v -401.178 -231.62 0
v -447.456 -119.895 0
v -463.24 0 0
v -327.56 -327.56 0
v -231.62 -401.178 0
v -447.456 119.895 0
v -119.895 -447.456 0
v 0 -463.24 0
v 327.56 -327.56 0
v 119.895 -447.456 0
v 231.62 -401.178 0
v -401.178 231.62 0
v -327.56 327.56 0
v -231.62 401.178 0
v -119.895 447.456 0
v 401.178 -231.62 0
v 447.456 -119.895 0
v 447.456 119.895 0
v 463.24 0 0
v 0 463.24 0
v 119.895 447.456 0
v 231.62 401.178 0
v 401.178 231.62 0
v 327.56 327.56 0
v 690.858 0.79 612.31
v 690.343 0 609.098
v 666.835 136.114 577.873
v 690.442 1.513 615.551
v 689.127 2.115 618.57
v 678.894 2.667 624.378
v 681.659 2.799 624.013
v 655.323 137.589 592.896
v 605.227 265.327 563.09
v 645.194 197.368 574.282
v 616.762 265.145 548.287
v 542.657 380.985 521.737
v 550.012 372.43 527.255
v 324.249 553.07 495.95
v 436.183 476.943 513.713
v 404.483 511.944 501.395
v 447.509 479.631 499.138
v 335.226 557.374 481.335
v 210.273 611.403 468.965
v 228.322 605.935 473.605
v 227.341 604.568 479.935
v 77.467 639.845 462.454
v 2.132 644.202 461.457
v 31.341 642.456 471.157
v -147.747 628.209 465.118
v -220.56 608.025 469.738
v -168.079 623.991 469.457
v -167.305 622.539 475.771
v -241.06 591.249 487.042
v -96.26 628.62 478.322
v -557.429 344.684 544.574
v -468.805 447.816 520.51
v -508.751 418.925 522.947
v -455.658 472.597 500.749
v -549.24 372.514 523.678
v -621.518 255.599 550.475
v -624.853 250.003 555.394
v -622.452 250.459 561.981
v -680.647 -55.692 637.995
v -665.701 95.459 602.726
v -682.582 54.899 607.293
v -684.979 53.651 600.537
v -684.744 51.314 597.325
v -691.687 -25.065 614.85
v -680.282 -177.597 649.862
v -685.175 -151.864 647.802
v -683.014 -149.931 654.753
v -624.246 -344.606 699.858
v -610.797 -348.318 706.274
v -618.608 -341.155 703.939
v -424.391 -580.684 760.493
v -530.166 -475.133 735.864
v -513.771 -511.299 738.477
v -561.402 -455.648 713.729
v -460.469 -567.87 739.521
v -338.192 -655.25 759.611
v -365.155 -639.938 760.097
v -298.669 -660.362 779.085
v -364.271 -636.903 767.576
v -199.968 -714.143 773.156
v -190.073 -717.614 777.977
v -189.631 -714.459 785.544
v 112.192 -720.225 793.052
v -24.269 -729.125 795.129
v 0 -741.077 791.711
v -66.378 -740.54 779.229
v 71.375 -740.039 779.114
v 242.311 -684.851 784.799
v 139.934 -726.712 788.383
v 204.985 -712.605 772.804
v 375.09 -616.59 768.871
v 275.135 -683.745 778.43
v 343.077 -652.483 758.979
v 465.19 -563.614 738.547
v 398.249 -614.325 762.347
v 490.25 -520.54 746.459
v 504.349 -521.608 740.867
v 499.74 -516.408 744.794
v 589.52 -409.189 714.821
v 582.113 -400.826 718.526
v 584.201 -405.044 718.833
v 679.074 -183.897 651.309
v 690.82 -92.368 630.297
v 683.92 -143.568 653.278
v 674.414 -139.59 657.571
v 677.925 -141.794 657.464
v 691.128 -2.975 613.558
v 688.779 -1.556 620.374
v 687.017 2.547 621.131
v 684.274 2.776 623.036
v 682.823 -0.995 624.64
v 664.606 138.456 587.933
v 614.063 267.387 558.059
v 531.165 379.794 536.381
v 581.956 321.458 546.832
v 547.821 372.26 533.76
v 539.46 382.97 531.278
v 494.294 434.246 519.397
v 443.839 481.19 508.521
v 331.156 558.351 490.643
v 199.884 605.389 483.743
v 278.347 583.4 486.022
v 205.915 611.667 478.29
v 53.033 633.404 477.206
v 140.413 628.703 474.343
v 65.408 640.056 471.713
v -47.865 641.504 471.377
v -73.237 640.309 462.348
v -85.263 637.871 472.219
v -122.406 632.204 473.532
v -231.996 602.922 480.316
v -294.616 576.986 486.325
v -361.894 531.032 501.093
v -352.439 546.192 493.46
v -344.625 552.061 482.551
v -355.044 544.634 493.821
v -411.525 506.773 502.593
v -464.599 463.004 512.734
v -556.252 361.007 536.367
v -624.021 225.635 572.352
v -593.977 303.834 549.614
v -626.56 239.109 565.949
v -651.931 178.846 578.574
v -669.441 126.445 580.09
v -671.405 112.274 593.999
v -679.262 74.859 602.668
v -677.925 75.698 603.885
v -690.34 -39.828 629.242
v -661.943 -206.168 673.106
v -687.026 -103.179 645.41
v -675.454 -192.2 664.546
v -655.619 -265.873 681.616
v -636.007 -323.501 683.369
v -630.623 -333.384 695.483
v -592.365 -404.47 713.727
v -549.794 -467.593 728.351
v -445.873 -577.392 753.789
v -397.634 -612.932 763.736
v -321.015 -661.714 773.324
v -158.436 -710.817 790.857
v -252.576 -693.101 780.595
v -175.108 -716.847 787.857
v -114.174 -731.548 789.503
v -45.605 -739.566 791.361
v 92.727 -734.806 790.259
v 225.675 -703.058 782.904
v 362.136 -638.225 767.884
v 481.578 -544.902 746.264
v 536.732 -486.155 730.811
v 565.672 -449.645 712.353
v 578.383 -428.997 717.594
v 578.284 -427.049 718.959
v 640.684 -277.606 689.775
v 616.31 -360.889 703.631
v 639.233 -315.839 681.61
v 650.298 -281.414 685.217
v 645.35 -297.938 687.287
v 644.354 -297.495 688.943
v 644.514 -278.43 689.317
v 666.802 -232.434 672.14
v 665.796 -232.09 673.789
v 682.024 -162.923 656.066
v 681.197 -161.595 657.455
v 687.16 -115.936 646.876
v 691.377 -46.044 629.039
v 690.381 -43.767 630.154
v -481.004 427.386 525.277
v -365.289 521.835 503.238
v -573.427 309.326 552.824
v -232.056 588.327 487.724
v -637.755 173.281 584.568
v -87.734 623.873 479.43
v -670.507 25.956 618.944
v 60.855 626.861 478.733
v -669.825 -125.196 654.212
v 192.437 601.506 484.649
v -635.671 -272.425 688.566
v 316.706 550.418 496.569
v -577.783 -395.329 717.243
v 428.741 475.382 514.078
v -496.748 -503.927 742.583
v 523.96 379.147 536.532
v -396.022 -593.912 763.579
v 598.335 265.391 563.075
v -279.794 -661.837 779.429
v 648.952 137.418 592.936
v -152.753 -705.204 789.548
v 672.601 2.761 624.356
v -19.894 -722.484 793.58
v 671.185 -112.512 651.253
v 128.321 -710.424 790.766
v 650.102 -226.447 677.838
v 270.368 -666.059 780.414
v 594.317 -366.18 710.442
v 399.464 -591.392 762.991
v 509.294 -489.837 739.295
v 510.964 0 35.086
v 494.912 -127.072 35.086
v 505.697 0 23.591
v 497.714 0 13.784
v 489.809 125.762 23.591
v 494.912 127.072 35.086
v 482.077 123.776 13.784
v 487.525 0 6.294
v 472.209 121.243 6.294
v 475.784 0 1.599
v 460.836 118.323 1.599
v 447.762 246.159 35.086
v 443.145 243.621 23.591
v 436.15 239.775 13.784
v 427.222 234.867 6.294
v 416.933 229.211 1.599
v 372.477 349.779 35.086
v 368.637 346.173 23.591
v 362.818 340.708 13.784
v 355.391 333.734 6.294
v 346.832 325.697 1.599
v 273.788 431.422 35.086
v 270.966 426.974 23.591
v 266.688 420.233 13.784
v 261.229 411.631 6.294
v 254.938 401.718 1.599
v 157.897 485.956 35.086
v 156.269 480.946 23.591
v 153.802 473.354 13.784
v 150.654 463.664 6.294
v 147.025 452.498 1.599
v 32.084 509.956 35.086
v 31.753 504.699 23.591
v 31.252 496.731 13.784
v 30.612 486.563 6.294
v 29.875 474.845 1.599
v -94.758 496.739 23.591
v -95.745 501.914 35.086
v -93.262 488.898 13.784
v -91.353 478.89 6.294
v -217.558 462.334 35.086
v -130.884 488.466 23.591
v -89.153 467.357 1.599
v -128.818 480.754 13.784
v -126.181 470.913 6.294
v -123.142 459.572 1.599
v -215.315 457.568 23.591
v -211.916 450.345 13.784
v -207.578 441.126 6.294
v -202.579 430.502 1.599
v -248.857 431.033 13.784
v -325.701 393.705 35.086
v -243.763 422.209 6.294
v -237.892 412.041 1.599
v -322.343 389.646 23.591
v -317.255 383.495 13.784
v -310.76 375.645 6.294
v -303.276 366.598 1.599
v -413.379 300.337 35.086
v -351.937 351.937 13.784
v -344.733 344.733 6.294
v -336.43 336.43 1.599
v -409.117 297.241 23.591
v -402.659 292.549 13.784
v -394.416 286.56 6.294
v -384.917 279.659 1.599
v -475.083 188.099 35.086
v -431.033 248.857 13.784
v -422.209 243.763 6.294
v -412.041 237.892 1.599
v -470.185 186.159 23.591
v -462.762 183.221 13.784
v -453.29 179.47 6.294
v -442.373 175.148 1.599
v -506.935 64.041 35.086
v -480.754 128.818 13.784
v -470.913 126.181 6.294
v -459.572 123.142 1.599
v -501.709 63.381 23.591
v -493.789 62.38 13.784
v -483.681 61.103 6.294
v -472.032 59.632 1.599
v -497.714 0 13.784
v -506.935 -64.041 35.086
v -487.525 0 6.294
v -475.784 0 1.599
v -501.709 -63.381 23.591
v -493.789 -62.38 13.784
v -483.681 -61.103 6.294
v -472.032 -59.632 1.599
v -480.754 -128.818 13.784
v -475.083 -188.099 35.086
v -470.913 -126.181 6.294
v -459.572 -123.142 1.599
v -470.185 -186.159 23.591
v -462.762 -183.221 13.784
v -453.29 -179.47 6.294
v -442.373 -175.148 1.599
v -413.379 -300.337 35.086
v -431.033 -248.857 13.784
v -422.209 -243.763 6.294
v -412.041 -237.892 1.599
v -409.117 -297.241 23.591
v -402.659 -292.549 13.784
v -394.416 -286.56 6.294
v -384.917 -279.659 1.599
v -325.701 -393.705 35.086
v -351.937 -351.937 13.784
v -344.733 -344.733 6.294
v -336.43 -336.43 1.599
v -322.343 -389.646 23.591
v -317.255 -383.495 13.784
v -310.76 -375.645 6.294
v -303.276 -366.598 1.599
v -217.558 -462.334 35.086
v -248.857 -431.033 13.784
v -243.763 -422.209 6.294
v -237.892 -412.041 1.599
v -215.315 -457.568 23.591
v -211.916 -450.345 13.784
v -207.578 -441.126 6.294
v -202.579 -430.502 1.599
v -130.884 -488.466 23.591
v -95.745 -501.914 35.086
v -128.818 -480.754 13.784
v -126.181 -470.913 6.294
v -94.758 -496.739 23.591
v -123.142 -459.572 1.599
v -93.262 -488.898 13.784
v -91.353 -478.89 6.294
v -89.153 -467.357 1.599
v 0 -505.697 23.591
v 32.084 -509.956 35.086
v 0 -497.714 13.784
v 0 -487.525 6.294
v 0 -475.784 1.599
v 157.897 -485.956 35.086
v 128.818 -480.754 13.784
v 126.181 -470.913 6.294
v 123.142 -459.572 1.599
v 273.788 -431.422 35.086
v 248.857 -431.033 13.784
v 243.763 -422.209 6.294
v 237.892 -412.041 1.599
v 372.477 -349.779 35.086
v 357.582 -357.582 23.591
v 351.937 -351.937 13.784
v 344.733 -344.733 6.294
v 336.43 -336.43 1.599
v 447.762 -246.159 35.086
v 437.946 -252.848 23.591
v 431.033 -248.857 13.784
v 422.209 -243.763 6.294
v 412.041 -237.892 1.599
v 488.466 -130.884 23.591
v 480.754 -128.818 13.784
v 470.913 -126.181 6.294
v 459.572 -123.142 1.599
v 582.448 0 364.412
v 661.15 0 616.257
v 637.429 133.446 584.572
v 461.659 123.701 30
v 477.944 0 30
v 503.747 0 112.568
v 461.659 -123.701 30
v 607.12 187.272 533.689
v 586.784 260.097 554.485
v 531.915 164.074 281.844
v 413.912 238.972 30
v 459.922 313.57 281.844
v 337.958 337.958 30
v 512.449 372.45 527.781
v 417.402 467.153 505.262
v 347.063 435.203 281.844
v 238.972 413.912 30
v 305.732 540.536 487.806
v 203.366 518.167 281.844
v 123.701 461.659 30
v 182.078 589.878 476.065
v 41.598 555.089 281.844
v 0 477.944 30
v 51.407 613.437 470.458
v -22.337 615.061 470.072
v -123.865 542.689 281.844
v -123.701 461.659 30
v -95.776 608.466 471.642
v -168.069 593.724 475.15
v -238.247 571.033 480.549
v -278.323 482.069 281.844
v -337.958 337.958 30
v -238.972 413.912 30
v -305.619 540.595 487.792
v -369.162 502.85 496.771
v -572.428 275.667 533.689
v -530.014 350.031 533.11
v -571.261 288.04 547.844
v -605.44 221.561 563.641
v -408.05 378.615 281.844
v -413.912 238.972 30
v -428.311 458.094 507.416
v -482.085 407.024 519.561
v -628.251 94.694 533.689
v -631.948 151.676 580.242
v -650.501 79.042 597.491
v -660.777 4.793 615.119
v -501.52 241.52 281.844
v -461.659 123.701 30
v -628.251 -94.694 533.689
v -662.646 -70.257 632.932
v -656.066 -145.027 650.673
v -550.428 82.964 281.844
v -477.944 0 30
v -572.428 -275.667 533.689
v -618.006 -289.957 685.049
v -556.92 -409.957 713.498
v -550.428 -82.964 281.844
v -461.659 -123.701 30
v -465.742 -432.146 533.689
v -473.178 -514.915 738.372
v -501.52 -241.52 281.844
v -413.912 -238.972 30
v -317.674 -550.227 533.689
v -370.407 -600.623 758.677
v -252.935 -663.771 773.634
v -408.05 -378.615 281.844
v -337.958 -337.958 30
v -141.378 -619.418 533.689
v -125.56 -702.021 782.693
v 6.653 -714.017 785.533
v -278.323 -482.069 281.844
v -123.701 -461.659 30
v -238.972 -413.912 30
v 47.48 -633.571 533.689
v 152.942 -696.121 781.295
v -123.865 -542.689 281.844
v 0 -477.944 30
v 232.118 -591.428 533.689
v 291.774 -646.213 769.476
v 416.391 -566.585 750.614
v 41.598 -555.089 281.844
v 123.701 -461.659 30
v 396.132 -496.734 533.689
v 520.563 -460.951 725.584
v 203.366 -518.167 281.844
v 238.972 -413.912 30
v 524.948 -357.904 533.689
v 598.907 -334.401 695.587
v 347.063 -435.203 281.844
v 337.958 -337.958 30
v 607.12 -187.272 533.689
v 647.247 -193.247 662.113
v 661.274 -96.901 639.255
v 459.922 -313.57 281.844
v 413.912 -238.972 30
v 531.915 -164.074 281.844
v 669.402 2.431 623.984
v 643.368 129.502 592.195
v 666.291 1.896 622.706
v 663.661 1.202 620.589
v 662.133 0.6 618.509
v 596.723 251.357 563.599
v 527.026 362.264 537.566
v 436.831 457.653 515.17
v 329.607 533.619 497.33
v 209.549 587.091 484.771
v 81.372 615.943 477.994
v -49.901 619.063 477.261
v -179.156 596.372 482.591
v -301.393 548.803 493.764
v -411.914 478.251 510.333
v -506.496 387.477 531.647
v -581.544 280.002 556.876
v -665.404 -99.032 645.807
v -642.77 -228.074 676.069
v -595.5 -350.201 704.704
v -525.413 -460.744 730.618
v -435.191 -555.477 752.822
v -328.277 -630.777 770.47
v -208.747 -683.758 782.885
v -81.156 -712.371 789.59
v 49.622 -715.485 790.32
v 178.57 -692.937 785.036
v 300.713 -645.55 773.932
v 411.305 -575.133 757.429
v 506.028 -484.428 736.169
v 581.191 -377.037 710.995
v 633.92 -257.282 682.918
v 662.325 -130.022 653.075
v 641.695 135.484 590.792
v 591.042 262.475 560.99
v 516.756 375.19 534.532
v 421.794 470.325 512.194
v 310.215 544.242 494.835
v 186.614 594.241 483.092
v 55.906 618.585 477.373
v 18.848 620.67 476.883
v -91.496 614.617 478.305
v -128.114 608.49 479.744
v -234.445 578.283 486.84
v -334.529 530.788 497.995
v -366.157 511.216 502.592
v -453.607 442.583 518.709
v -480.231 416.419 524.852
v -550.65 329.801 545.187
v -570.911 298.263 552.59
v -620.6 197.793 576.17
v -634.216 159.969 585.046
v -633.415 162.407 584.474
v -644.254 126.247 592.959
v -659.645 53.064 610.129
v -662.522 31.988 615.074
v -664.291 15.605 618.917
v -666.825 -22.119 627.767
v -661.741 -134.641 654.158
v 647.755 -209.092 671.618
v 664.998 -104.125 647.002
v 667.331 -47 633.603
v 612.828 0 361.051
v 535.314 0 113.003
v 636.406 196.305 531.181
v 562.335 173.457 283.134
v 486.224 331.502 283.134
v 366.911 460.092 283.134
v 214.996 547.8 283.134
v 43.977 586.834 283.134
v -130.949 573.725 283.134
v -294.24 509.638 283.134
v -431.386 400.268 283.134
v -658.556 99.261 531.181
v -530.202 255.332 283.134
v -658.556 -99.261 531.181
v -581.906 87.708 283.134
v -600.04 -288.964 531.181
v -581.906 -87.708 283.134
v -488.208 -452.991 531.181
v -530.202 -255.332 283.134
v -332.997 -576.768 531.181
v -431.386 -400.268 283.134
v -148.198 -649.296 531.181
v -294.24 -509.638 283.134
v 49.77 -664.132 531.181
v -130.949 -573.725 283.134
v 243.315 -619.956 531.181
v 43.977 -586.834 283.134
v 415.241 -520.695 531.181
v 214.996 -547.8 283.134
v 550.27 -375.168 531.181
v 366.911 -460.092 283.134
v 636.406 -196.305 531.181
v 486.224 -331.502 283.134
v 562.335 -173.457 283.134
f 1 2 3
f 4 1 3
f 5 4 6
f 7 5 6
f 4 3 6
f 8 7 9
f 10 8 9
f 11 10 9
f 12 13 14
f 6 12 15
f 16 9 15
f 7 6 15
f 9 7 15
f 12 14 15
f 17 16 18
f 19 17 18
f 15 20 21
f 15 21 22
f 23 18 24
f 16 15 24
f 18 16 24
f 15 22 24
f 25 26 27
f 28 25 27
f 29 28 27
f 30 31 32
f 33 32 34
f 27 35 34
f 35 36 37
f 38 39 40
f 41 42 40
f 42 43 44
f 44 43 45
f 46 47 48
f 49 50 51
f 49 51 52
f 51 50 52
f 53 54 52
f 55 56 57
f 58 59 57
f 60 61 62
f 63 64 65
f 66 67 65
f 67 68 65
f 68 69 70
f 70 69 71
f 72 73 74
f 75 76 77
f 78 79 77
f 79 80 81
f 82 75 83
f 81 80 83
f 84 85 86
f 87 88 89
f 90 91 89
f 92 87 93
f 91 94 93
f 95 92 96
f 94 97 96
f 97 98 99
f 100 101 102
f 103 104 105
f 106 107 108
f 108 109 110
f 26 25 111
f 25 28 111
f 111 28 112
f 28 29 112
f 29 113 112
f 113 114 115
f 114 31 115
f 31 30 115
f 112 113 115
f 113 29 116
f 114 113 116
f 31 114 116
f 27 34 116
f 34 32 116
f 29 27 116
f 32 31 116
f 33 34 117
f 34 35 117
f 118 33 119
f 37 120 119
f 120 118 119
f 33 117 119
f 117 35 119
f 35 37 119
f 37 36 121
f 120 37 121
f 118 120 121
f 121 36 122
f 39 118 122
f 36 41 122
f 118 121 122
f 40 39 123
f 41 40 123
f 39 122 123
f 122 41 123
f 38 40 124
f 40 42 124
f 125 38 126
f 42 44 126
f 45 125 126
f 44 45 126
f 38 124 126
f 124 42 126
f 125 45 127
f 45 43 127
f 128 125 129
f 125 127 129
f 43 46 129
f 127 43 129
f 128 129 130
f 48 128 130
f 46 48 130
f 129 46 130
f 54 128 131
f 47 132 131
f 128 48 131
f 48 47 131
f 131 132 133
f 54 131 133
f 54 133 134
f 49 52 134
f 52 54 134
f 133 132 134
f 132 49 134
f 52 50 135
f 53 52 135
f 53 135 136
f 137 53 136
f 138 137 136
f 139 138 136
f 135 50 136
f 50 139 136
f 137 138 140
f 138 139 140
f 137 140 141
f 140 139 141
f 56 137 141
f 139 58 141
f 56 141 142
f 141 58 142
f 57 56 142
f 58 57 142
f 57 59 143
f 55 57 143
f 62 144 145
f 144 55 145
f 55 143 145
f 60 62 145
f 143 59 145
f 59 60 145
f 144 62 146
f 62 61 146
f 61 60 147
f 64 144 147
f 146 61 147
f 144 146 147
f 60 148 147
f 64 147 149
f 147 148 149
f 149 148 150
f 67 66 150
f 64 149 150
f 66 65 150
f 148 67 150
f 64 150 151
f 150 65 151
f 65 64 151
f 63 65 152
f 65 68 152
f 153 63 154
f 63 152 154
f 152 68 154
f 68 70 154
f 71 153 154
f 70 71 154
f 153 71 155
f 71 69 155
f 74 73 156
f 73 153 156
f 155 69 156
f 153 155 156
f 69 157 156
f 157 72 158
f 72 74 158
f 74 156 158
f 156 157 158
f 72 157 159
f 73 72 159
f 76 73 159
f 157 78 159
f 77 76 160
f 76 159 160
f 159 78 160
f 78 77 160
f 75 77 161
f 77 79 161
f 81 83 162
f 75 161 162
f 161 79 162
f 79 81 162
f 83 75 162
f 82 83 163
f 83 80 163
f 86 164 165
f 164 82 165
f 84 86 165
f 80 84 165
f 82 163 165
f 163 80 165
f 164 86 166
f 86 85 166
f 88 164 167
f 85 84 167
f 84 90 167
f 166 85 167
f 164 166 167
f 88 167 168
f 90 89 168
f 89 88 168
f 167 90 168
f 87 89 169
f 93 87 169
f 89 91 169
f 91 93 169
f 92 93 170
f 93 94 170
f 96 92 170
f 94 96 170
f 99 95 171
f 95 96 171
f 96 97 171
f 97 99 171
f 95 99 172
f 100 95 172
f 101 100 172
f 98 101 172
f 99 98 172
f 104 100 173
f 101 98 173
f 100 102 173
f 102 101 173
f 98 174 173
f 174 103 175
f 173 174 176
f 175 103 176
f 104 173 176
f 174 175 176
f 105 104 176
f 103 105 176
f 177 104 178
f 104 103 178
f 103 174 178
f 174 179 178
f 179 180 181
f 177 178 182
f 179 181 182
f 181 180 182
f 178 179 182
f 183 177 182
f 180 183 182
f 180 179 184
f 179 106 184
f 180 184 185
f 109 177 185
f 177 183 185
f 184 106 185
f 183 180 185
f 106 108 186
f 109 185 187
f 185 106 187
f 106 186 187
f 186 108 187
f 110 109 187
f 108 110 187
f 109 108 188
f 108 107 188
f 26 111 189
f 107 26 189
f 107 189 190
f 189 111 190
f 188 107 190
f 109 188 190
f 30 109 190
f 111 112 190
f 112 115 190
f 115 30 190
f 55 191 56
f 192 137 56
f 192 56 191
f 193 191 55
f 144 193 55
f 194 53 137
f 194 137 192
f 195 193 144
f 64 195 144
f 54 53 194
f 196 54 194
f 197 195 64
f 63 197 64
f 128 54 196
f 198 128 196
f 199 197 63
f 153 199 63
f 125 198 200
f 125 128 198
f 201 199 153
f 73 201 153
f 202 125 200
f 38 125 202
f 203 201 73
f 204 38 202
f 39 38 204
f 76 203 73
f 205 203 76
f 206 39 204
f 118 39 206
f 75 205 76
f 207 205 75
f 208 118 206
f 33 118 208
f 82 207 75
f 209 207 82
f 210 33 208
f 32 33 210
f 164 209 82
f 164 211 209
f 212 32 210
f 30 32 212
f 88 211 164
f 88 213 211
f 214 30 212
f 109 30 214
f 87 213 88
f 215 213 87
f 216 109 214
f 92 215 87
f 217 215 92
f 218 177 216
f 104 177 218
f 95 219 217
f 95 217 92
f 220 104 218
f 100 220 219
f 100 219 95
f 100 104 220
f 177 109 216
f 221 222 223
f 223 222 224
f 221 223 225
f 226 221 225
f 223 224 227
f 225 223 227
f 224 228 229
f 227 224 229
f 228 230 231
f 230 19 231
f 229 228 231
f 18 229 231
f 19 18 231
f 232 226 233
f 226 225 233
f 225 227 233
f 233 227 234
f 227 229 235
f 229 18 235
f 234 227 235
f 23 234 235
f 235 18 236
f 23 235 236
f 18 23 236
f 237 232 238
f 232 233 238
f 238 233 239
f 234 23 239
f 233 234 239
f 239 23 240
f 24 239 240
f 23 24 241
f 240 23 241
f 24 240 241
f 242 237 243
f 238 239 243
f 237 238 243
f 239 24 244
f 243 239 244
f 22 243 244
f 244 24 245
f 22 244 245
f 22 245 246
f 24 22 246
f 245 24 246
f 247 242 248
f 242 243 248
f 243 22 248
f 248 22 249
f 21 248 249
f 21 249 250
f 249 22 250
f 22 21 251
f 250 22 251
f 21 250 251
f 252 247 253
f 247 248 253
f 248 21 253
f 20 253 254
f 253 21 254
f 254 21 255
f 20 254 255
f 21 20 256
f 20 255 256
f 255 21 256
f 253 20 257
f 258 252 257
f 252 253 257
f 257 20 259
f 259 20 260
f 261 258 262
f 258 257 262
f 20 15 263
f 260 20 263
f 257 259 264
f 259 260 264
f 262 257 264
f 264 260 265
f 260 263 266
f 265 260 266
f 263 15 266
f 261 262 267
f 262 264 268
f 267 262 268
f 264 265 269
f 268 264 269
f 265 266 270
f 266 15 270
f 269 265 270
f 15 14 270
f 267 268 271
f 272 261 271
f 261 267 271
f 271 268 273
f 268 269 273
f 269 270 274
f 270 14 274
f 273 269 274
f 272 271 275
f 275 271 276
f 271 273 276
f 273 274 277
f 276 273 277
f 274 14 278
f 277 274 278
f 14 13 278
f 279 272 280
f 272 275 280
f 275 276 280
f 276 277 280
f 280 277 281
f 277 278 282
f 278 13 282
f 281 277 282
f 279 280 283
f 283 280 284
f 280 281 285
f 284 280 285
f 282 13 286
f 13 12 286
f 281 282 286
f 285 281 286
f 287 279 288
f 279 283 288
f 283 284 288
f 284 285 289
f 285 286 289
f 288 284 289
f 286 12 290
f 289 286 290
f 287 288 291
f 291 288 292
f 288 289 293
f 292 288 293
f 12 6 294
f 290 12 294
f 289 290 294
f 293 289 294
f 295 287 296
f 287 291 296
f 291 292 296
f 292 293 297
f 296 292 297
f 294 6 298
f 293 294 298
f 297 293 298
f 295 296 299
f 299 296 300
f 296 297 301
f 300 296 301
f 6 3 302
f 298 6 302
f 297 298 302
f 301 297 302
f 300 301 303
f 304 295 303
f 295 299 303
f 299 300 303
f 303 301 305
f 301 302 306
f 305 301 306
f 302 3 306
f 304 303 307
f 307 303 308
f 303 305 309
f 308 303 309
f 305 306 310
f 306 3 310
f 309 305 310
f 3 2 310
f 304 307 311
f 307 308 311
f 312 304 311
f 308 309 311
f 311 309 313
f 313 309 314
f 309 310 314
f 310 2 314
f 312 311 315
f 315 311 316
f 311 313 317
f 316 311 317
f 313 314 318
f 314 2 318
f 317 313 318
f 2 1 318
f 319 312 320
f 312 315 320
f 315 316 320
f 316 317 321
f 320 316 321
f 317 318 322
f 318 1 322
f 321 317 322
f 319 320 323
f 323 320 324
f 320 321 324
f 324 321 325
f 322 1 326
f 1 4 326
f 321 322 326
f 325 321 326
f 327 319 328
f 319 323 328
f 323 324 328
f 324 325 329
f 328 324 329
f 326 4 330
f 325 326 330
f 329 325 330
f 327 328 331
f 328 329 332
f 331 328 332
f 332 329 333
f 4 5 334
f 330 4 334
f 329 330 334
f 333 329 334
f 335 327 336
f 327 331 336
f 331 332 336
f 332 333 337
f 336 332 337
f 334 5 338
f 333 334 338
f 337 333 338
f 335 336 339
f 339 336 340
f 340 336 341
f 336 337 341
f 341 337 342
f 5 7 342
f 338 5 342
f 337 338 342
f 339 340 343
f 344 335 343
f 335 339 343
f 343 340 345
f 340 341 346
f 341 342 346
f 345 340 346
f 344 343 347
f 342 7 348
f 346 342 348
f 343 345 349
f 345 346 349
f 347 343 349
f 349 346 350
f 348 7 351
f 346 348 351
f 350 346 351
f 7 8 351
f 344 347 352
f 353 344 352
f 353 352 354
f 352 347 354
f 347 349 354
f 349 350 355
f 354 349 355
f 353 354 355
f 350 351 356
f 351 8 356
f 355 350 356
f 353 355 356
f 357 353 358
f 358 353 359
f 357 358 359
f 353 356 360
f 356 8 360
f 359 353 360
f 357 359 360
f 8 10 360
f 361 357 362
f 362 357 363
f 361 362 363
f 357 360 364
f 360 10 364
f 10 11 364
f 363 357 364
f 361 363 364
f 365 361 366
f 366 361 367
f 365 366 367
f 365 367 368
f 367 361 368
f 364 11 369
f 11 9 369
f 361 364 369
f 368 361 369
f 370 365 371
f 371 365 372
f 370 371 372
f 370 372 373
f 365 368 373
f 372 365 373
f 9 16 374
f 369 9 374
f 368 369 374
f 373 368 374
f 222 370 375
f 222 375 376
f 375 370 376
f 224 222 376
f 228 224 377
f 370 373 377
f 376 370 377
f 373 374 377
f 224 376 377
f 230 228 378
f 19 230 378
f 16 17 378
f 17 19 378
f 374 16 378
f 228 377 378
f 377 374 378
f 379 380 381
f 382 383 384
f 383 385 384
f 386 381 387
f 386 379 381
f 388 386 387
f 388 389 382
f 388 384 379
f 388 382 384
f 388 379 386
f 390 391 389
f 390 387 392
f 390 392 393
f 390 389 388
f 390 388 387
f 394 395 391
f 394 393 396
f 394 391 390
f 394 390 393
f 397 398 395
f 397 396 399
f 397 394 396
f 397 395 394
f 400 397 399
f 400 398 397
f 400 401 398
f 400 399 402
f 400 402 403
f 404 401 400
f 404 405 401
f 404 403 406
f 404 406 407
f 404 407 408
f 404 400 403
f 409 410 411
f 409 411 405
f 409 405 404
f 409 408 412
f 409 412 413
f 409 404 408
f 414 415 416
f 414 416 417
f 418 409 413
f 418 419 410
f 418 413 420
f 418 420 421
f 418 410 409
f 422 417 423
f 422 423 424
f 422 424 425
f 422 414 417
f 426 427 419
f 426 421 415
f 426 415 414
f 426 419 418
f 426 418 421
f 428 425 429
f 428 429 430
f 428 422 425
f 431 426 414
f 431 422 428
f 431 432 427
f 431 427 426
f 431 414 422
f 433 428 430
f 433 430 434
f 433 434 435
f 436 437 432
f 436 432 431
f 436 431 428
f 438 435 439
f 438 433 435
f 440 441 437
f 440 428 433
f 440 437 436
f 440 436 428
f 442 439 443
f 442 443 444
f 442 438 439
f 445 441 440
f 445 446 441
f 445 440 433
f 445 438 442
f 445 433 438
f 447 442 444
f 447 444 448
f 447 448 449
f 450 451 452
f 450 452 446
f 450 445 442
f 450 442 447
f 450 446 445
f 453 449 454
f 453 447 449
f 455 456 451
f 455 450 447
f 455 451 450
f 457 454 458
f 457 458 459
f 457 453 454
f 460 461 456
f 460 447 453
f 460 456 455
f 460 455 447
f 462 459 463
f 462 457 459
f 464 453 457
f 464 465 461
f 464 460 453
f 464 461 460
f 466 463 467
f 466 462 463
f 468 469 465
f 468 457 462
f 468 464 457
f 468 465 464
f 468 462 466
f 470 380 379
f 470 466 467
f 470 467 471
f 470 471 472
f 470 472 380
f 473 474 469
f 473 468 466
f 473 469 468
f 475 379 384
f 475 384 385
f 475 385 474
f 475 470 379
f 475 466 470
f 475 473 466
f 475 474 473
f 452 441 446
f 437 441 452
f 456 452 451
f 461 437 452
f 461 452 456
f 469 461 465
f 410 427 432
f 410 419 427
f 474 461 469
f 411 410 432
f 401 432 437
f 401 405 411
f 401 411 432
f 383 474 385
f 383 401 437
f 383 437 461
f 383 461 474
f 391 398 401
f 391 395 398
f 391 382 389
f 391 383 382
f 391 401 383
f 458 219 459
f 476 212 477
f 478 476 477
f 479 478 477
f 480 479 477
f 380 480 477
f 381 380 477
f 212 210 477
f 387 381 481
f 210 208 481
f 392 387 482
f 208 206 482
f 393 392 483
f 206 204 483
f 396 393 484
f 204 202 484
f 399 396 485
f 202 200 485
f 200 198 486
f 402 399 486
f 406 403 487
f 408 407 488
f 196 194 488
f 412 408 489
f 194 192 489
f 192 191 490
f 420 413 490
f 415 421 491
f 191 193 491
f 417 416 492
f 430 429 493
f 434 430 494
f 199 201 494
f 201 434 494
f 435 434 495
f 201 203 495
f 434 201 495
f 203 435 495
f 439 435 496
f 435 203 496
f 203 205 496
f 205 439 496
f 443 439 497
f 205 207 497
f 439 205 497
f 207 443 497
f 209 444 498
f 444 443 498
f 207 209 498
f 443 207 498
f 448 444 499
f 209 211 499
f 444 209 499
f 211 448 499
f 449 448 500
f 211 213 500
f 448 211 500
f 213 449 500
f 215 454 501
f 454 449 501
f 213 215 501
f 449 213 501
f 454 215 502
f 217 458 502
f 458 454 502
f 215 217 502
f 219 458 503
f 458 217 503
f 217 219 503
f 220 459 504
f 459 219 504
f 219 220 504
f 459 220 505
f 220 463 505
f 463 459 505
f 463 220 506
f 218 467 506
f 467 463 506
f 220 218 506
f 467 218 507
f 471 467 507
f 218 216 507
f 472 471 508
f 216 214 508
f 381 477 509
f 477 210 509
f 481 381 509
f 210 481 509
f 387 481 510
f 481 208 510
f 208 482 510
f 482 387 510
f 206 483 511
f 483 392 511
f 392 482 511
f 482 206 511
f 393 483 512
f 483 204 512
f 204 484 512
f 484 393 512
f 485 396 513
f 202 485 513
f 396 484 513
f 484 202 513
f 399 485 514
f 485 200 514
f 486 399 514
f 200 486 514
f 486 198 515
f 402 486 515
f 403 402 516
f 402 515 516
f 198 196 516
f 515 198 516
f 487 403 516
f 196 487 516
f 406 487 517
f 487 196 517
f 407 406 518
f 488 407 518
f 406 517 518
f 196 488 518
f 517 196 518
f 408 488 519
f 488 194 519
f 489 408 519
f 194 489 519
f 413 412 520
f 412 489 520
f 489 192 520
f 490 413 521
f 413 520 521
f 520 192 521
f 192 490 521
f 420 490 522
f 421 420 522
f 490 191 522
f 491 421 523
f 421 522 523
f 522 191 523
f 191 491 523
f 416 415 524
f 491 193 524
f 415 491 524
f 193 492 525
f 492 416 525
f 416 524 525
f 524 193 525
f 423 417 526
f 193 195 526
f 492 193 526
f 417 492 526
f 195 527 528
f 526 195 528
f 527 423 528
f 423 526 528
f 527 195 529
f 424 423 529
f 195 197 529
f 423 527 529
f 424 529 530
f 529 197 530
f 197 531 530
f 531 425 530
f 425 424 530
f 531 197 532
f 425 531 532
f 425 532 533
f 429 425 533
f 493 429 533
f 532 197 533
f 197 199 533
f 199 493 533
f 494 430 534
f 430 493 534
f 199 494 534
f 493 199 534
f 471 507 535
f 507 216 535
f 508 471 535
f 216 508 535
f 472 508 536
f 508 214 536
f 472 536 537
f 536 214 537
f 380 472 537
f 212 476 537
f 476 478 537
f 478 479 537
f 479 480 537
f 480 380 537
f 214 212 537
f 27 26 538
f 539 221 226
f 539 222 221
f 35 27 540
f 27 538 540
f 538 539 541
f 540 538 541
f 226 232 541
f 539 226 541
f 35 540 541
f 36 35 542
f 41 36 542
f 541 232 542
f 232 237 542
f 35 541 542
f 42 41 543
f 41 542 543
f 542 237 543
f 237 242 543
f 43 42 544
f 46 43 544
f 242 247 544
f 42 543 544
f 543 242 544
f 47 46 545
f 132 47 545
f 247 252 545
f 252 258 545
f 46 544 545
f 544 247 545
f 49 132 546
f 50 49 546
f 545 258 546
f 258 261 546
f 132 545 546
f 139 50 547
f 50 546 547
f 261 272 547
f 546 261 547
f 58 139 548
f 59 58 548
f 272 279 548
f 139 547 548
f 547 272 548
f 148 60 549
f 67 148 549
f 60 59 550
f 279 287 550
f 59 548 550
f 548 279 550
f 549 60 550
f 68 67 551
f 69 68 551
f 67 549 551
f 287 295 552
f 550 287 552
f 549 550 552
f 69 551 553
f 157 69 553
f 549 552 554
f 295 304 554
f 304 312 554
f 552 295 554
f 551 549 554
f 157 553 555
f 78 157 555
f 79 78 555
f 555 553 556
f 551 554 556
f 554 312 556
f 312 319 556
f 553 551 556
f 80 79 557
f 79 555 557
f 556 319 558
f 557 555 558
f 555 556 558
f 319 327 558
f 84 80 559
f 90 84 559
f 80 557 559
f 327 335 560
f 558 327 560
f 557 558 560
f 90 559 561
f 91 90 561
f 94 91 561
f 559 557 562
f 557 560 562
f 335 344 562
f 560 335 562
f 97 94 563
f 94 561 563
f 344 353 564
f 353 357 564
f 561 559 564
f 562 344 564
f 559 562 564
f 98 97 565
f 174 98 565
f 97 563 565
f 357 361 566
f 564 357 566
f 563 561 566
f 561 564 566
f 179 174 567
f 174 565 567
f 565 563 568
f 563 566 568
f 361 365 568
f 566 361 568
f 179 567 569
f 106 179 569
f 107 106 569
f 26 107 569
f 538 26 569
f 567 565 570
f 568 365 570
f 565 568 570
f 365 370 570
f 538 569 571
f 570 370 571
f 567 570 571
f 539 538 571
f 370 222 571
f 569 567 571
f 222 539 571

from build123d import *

# Parameters (mm, degrees)
EXTRUDE_DEPTH = 750
SKETCH001_R   = 750
SKETCH_R      = 500
THICKNESS_T   = -30
FILLET_1_R    = 50
FILLET_2_R    = 12


with BuildPart() as extrude_body:
    # Sketch002 → Extrude (new body, symmetric)
    with BuildSketch(Plane.YZ):
        Polygon((-750, 800), (-750, 0), (750, 0), (750, 450), align=None)
    extrude(amount=EXTRUDE_DEPTH, both=True)


with BuildPart() as fillet_body:
    # Sketch001 → Loft section 0
    with BuildSketch(Plane.XY.offset(800)):
        Circle(SKETCH001_R)
    # Sketch → Loft section 1
    with BuildSketch(Plane.XY):
        Circle(SKETCH_R)
    loft()

    # Thickness
    thickness_openings = [fillet_body.faces().sort_by_distance(p)[0] for p in [
        (0, 0, 800),
    ]]
    offset(amount=THICKNESS_T, openings=thickness_openings, kind=Kind.INTERSECTION)

    # Common: intersect Extrude body
    add(extrude_body.part, mode=Mode.INTERSECT)

    # Fillet 1
    fillet_1_edges = [fillet_body.edges().sort_by_distance(p)[0] for p in [
        (-500, 0, 0),
    ]]
    fillet(fillet_1_edges, radius=FILLET_1_R)

    # Fillet 2
    fillet_2_edges = [fillet_body.edges().sort_by_distance(p)[0] for p in [
        (-514.311014, 420.952843, 526.77767),
        (514.311013, -522.894591, 747.008738),
        (-663.881777, -97.33354, 647.711159),
    ]]
    fillet(fillet_2_edges, radius=FILLET_2_R)


solid = fillet_body.part
